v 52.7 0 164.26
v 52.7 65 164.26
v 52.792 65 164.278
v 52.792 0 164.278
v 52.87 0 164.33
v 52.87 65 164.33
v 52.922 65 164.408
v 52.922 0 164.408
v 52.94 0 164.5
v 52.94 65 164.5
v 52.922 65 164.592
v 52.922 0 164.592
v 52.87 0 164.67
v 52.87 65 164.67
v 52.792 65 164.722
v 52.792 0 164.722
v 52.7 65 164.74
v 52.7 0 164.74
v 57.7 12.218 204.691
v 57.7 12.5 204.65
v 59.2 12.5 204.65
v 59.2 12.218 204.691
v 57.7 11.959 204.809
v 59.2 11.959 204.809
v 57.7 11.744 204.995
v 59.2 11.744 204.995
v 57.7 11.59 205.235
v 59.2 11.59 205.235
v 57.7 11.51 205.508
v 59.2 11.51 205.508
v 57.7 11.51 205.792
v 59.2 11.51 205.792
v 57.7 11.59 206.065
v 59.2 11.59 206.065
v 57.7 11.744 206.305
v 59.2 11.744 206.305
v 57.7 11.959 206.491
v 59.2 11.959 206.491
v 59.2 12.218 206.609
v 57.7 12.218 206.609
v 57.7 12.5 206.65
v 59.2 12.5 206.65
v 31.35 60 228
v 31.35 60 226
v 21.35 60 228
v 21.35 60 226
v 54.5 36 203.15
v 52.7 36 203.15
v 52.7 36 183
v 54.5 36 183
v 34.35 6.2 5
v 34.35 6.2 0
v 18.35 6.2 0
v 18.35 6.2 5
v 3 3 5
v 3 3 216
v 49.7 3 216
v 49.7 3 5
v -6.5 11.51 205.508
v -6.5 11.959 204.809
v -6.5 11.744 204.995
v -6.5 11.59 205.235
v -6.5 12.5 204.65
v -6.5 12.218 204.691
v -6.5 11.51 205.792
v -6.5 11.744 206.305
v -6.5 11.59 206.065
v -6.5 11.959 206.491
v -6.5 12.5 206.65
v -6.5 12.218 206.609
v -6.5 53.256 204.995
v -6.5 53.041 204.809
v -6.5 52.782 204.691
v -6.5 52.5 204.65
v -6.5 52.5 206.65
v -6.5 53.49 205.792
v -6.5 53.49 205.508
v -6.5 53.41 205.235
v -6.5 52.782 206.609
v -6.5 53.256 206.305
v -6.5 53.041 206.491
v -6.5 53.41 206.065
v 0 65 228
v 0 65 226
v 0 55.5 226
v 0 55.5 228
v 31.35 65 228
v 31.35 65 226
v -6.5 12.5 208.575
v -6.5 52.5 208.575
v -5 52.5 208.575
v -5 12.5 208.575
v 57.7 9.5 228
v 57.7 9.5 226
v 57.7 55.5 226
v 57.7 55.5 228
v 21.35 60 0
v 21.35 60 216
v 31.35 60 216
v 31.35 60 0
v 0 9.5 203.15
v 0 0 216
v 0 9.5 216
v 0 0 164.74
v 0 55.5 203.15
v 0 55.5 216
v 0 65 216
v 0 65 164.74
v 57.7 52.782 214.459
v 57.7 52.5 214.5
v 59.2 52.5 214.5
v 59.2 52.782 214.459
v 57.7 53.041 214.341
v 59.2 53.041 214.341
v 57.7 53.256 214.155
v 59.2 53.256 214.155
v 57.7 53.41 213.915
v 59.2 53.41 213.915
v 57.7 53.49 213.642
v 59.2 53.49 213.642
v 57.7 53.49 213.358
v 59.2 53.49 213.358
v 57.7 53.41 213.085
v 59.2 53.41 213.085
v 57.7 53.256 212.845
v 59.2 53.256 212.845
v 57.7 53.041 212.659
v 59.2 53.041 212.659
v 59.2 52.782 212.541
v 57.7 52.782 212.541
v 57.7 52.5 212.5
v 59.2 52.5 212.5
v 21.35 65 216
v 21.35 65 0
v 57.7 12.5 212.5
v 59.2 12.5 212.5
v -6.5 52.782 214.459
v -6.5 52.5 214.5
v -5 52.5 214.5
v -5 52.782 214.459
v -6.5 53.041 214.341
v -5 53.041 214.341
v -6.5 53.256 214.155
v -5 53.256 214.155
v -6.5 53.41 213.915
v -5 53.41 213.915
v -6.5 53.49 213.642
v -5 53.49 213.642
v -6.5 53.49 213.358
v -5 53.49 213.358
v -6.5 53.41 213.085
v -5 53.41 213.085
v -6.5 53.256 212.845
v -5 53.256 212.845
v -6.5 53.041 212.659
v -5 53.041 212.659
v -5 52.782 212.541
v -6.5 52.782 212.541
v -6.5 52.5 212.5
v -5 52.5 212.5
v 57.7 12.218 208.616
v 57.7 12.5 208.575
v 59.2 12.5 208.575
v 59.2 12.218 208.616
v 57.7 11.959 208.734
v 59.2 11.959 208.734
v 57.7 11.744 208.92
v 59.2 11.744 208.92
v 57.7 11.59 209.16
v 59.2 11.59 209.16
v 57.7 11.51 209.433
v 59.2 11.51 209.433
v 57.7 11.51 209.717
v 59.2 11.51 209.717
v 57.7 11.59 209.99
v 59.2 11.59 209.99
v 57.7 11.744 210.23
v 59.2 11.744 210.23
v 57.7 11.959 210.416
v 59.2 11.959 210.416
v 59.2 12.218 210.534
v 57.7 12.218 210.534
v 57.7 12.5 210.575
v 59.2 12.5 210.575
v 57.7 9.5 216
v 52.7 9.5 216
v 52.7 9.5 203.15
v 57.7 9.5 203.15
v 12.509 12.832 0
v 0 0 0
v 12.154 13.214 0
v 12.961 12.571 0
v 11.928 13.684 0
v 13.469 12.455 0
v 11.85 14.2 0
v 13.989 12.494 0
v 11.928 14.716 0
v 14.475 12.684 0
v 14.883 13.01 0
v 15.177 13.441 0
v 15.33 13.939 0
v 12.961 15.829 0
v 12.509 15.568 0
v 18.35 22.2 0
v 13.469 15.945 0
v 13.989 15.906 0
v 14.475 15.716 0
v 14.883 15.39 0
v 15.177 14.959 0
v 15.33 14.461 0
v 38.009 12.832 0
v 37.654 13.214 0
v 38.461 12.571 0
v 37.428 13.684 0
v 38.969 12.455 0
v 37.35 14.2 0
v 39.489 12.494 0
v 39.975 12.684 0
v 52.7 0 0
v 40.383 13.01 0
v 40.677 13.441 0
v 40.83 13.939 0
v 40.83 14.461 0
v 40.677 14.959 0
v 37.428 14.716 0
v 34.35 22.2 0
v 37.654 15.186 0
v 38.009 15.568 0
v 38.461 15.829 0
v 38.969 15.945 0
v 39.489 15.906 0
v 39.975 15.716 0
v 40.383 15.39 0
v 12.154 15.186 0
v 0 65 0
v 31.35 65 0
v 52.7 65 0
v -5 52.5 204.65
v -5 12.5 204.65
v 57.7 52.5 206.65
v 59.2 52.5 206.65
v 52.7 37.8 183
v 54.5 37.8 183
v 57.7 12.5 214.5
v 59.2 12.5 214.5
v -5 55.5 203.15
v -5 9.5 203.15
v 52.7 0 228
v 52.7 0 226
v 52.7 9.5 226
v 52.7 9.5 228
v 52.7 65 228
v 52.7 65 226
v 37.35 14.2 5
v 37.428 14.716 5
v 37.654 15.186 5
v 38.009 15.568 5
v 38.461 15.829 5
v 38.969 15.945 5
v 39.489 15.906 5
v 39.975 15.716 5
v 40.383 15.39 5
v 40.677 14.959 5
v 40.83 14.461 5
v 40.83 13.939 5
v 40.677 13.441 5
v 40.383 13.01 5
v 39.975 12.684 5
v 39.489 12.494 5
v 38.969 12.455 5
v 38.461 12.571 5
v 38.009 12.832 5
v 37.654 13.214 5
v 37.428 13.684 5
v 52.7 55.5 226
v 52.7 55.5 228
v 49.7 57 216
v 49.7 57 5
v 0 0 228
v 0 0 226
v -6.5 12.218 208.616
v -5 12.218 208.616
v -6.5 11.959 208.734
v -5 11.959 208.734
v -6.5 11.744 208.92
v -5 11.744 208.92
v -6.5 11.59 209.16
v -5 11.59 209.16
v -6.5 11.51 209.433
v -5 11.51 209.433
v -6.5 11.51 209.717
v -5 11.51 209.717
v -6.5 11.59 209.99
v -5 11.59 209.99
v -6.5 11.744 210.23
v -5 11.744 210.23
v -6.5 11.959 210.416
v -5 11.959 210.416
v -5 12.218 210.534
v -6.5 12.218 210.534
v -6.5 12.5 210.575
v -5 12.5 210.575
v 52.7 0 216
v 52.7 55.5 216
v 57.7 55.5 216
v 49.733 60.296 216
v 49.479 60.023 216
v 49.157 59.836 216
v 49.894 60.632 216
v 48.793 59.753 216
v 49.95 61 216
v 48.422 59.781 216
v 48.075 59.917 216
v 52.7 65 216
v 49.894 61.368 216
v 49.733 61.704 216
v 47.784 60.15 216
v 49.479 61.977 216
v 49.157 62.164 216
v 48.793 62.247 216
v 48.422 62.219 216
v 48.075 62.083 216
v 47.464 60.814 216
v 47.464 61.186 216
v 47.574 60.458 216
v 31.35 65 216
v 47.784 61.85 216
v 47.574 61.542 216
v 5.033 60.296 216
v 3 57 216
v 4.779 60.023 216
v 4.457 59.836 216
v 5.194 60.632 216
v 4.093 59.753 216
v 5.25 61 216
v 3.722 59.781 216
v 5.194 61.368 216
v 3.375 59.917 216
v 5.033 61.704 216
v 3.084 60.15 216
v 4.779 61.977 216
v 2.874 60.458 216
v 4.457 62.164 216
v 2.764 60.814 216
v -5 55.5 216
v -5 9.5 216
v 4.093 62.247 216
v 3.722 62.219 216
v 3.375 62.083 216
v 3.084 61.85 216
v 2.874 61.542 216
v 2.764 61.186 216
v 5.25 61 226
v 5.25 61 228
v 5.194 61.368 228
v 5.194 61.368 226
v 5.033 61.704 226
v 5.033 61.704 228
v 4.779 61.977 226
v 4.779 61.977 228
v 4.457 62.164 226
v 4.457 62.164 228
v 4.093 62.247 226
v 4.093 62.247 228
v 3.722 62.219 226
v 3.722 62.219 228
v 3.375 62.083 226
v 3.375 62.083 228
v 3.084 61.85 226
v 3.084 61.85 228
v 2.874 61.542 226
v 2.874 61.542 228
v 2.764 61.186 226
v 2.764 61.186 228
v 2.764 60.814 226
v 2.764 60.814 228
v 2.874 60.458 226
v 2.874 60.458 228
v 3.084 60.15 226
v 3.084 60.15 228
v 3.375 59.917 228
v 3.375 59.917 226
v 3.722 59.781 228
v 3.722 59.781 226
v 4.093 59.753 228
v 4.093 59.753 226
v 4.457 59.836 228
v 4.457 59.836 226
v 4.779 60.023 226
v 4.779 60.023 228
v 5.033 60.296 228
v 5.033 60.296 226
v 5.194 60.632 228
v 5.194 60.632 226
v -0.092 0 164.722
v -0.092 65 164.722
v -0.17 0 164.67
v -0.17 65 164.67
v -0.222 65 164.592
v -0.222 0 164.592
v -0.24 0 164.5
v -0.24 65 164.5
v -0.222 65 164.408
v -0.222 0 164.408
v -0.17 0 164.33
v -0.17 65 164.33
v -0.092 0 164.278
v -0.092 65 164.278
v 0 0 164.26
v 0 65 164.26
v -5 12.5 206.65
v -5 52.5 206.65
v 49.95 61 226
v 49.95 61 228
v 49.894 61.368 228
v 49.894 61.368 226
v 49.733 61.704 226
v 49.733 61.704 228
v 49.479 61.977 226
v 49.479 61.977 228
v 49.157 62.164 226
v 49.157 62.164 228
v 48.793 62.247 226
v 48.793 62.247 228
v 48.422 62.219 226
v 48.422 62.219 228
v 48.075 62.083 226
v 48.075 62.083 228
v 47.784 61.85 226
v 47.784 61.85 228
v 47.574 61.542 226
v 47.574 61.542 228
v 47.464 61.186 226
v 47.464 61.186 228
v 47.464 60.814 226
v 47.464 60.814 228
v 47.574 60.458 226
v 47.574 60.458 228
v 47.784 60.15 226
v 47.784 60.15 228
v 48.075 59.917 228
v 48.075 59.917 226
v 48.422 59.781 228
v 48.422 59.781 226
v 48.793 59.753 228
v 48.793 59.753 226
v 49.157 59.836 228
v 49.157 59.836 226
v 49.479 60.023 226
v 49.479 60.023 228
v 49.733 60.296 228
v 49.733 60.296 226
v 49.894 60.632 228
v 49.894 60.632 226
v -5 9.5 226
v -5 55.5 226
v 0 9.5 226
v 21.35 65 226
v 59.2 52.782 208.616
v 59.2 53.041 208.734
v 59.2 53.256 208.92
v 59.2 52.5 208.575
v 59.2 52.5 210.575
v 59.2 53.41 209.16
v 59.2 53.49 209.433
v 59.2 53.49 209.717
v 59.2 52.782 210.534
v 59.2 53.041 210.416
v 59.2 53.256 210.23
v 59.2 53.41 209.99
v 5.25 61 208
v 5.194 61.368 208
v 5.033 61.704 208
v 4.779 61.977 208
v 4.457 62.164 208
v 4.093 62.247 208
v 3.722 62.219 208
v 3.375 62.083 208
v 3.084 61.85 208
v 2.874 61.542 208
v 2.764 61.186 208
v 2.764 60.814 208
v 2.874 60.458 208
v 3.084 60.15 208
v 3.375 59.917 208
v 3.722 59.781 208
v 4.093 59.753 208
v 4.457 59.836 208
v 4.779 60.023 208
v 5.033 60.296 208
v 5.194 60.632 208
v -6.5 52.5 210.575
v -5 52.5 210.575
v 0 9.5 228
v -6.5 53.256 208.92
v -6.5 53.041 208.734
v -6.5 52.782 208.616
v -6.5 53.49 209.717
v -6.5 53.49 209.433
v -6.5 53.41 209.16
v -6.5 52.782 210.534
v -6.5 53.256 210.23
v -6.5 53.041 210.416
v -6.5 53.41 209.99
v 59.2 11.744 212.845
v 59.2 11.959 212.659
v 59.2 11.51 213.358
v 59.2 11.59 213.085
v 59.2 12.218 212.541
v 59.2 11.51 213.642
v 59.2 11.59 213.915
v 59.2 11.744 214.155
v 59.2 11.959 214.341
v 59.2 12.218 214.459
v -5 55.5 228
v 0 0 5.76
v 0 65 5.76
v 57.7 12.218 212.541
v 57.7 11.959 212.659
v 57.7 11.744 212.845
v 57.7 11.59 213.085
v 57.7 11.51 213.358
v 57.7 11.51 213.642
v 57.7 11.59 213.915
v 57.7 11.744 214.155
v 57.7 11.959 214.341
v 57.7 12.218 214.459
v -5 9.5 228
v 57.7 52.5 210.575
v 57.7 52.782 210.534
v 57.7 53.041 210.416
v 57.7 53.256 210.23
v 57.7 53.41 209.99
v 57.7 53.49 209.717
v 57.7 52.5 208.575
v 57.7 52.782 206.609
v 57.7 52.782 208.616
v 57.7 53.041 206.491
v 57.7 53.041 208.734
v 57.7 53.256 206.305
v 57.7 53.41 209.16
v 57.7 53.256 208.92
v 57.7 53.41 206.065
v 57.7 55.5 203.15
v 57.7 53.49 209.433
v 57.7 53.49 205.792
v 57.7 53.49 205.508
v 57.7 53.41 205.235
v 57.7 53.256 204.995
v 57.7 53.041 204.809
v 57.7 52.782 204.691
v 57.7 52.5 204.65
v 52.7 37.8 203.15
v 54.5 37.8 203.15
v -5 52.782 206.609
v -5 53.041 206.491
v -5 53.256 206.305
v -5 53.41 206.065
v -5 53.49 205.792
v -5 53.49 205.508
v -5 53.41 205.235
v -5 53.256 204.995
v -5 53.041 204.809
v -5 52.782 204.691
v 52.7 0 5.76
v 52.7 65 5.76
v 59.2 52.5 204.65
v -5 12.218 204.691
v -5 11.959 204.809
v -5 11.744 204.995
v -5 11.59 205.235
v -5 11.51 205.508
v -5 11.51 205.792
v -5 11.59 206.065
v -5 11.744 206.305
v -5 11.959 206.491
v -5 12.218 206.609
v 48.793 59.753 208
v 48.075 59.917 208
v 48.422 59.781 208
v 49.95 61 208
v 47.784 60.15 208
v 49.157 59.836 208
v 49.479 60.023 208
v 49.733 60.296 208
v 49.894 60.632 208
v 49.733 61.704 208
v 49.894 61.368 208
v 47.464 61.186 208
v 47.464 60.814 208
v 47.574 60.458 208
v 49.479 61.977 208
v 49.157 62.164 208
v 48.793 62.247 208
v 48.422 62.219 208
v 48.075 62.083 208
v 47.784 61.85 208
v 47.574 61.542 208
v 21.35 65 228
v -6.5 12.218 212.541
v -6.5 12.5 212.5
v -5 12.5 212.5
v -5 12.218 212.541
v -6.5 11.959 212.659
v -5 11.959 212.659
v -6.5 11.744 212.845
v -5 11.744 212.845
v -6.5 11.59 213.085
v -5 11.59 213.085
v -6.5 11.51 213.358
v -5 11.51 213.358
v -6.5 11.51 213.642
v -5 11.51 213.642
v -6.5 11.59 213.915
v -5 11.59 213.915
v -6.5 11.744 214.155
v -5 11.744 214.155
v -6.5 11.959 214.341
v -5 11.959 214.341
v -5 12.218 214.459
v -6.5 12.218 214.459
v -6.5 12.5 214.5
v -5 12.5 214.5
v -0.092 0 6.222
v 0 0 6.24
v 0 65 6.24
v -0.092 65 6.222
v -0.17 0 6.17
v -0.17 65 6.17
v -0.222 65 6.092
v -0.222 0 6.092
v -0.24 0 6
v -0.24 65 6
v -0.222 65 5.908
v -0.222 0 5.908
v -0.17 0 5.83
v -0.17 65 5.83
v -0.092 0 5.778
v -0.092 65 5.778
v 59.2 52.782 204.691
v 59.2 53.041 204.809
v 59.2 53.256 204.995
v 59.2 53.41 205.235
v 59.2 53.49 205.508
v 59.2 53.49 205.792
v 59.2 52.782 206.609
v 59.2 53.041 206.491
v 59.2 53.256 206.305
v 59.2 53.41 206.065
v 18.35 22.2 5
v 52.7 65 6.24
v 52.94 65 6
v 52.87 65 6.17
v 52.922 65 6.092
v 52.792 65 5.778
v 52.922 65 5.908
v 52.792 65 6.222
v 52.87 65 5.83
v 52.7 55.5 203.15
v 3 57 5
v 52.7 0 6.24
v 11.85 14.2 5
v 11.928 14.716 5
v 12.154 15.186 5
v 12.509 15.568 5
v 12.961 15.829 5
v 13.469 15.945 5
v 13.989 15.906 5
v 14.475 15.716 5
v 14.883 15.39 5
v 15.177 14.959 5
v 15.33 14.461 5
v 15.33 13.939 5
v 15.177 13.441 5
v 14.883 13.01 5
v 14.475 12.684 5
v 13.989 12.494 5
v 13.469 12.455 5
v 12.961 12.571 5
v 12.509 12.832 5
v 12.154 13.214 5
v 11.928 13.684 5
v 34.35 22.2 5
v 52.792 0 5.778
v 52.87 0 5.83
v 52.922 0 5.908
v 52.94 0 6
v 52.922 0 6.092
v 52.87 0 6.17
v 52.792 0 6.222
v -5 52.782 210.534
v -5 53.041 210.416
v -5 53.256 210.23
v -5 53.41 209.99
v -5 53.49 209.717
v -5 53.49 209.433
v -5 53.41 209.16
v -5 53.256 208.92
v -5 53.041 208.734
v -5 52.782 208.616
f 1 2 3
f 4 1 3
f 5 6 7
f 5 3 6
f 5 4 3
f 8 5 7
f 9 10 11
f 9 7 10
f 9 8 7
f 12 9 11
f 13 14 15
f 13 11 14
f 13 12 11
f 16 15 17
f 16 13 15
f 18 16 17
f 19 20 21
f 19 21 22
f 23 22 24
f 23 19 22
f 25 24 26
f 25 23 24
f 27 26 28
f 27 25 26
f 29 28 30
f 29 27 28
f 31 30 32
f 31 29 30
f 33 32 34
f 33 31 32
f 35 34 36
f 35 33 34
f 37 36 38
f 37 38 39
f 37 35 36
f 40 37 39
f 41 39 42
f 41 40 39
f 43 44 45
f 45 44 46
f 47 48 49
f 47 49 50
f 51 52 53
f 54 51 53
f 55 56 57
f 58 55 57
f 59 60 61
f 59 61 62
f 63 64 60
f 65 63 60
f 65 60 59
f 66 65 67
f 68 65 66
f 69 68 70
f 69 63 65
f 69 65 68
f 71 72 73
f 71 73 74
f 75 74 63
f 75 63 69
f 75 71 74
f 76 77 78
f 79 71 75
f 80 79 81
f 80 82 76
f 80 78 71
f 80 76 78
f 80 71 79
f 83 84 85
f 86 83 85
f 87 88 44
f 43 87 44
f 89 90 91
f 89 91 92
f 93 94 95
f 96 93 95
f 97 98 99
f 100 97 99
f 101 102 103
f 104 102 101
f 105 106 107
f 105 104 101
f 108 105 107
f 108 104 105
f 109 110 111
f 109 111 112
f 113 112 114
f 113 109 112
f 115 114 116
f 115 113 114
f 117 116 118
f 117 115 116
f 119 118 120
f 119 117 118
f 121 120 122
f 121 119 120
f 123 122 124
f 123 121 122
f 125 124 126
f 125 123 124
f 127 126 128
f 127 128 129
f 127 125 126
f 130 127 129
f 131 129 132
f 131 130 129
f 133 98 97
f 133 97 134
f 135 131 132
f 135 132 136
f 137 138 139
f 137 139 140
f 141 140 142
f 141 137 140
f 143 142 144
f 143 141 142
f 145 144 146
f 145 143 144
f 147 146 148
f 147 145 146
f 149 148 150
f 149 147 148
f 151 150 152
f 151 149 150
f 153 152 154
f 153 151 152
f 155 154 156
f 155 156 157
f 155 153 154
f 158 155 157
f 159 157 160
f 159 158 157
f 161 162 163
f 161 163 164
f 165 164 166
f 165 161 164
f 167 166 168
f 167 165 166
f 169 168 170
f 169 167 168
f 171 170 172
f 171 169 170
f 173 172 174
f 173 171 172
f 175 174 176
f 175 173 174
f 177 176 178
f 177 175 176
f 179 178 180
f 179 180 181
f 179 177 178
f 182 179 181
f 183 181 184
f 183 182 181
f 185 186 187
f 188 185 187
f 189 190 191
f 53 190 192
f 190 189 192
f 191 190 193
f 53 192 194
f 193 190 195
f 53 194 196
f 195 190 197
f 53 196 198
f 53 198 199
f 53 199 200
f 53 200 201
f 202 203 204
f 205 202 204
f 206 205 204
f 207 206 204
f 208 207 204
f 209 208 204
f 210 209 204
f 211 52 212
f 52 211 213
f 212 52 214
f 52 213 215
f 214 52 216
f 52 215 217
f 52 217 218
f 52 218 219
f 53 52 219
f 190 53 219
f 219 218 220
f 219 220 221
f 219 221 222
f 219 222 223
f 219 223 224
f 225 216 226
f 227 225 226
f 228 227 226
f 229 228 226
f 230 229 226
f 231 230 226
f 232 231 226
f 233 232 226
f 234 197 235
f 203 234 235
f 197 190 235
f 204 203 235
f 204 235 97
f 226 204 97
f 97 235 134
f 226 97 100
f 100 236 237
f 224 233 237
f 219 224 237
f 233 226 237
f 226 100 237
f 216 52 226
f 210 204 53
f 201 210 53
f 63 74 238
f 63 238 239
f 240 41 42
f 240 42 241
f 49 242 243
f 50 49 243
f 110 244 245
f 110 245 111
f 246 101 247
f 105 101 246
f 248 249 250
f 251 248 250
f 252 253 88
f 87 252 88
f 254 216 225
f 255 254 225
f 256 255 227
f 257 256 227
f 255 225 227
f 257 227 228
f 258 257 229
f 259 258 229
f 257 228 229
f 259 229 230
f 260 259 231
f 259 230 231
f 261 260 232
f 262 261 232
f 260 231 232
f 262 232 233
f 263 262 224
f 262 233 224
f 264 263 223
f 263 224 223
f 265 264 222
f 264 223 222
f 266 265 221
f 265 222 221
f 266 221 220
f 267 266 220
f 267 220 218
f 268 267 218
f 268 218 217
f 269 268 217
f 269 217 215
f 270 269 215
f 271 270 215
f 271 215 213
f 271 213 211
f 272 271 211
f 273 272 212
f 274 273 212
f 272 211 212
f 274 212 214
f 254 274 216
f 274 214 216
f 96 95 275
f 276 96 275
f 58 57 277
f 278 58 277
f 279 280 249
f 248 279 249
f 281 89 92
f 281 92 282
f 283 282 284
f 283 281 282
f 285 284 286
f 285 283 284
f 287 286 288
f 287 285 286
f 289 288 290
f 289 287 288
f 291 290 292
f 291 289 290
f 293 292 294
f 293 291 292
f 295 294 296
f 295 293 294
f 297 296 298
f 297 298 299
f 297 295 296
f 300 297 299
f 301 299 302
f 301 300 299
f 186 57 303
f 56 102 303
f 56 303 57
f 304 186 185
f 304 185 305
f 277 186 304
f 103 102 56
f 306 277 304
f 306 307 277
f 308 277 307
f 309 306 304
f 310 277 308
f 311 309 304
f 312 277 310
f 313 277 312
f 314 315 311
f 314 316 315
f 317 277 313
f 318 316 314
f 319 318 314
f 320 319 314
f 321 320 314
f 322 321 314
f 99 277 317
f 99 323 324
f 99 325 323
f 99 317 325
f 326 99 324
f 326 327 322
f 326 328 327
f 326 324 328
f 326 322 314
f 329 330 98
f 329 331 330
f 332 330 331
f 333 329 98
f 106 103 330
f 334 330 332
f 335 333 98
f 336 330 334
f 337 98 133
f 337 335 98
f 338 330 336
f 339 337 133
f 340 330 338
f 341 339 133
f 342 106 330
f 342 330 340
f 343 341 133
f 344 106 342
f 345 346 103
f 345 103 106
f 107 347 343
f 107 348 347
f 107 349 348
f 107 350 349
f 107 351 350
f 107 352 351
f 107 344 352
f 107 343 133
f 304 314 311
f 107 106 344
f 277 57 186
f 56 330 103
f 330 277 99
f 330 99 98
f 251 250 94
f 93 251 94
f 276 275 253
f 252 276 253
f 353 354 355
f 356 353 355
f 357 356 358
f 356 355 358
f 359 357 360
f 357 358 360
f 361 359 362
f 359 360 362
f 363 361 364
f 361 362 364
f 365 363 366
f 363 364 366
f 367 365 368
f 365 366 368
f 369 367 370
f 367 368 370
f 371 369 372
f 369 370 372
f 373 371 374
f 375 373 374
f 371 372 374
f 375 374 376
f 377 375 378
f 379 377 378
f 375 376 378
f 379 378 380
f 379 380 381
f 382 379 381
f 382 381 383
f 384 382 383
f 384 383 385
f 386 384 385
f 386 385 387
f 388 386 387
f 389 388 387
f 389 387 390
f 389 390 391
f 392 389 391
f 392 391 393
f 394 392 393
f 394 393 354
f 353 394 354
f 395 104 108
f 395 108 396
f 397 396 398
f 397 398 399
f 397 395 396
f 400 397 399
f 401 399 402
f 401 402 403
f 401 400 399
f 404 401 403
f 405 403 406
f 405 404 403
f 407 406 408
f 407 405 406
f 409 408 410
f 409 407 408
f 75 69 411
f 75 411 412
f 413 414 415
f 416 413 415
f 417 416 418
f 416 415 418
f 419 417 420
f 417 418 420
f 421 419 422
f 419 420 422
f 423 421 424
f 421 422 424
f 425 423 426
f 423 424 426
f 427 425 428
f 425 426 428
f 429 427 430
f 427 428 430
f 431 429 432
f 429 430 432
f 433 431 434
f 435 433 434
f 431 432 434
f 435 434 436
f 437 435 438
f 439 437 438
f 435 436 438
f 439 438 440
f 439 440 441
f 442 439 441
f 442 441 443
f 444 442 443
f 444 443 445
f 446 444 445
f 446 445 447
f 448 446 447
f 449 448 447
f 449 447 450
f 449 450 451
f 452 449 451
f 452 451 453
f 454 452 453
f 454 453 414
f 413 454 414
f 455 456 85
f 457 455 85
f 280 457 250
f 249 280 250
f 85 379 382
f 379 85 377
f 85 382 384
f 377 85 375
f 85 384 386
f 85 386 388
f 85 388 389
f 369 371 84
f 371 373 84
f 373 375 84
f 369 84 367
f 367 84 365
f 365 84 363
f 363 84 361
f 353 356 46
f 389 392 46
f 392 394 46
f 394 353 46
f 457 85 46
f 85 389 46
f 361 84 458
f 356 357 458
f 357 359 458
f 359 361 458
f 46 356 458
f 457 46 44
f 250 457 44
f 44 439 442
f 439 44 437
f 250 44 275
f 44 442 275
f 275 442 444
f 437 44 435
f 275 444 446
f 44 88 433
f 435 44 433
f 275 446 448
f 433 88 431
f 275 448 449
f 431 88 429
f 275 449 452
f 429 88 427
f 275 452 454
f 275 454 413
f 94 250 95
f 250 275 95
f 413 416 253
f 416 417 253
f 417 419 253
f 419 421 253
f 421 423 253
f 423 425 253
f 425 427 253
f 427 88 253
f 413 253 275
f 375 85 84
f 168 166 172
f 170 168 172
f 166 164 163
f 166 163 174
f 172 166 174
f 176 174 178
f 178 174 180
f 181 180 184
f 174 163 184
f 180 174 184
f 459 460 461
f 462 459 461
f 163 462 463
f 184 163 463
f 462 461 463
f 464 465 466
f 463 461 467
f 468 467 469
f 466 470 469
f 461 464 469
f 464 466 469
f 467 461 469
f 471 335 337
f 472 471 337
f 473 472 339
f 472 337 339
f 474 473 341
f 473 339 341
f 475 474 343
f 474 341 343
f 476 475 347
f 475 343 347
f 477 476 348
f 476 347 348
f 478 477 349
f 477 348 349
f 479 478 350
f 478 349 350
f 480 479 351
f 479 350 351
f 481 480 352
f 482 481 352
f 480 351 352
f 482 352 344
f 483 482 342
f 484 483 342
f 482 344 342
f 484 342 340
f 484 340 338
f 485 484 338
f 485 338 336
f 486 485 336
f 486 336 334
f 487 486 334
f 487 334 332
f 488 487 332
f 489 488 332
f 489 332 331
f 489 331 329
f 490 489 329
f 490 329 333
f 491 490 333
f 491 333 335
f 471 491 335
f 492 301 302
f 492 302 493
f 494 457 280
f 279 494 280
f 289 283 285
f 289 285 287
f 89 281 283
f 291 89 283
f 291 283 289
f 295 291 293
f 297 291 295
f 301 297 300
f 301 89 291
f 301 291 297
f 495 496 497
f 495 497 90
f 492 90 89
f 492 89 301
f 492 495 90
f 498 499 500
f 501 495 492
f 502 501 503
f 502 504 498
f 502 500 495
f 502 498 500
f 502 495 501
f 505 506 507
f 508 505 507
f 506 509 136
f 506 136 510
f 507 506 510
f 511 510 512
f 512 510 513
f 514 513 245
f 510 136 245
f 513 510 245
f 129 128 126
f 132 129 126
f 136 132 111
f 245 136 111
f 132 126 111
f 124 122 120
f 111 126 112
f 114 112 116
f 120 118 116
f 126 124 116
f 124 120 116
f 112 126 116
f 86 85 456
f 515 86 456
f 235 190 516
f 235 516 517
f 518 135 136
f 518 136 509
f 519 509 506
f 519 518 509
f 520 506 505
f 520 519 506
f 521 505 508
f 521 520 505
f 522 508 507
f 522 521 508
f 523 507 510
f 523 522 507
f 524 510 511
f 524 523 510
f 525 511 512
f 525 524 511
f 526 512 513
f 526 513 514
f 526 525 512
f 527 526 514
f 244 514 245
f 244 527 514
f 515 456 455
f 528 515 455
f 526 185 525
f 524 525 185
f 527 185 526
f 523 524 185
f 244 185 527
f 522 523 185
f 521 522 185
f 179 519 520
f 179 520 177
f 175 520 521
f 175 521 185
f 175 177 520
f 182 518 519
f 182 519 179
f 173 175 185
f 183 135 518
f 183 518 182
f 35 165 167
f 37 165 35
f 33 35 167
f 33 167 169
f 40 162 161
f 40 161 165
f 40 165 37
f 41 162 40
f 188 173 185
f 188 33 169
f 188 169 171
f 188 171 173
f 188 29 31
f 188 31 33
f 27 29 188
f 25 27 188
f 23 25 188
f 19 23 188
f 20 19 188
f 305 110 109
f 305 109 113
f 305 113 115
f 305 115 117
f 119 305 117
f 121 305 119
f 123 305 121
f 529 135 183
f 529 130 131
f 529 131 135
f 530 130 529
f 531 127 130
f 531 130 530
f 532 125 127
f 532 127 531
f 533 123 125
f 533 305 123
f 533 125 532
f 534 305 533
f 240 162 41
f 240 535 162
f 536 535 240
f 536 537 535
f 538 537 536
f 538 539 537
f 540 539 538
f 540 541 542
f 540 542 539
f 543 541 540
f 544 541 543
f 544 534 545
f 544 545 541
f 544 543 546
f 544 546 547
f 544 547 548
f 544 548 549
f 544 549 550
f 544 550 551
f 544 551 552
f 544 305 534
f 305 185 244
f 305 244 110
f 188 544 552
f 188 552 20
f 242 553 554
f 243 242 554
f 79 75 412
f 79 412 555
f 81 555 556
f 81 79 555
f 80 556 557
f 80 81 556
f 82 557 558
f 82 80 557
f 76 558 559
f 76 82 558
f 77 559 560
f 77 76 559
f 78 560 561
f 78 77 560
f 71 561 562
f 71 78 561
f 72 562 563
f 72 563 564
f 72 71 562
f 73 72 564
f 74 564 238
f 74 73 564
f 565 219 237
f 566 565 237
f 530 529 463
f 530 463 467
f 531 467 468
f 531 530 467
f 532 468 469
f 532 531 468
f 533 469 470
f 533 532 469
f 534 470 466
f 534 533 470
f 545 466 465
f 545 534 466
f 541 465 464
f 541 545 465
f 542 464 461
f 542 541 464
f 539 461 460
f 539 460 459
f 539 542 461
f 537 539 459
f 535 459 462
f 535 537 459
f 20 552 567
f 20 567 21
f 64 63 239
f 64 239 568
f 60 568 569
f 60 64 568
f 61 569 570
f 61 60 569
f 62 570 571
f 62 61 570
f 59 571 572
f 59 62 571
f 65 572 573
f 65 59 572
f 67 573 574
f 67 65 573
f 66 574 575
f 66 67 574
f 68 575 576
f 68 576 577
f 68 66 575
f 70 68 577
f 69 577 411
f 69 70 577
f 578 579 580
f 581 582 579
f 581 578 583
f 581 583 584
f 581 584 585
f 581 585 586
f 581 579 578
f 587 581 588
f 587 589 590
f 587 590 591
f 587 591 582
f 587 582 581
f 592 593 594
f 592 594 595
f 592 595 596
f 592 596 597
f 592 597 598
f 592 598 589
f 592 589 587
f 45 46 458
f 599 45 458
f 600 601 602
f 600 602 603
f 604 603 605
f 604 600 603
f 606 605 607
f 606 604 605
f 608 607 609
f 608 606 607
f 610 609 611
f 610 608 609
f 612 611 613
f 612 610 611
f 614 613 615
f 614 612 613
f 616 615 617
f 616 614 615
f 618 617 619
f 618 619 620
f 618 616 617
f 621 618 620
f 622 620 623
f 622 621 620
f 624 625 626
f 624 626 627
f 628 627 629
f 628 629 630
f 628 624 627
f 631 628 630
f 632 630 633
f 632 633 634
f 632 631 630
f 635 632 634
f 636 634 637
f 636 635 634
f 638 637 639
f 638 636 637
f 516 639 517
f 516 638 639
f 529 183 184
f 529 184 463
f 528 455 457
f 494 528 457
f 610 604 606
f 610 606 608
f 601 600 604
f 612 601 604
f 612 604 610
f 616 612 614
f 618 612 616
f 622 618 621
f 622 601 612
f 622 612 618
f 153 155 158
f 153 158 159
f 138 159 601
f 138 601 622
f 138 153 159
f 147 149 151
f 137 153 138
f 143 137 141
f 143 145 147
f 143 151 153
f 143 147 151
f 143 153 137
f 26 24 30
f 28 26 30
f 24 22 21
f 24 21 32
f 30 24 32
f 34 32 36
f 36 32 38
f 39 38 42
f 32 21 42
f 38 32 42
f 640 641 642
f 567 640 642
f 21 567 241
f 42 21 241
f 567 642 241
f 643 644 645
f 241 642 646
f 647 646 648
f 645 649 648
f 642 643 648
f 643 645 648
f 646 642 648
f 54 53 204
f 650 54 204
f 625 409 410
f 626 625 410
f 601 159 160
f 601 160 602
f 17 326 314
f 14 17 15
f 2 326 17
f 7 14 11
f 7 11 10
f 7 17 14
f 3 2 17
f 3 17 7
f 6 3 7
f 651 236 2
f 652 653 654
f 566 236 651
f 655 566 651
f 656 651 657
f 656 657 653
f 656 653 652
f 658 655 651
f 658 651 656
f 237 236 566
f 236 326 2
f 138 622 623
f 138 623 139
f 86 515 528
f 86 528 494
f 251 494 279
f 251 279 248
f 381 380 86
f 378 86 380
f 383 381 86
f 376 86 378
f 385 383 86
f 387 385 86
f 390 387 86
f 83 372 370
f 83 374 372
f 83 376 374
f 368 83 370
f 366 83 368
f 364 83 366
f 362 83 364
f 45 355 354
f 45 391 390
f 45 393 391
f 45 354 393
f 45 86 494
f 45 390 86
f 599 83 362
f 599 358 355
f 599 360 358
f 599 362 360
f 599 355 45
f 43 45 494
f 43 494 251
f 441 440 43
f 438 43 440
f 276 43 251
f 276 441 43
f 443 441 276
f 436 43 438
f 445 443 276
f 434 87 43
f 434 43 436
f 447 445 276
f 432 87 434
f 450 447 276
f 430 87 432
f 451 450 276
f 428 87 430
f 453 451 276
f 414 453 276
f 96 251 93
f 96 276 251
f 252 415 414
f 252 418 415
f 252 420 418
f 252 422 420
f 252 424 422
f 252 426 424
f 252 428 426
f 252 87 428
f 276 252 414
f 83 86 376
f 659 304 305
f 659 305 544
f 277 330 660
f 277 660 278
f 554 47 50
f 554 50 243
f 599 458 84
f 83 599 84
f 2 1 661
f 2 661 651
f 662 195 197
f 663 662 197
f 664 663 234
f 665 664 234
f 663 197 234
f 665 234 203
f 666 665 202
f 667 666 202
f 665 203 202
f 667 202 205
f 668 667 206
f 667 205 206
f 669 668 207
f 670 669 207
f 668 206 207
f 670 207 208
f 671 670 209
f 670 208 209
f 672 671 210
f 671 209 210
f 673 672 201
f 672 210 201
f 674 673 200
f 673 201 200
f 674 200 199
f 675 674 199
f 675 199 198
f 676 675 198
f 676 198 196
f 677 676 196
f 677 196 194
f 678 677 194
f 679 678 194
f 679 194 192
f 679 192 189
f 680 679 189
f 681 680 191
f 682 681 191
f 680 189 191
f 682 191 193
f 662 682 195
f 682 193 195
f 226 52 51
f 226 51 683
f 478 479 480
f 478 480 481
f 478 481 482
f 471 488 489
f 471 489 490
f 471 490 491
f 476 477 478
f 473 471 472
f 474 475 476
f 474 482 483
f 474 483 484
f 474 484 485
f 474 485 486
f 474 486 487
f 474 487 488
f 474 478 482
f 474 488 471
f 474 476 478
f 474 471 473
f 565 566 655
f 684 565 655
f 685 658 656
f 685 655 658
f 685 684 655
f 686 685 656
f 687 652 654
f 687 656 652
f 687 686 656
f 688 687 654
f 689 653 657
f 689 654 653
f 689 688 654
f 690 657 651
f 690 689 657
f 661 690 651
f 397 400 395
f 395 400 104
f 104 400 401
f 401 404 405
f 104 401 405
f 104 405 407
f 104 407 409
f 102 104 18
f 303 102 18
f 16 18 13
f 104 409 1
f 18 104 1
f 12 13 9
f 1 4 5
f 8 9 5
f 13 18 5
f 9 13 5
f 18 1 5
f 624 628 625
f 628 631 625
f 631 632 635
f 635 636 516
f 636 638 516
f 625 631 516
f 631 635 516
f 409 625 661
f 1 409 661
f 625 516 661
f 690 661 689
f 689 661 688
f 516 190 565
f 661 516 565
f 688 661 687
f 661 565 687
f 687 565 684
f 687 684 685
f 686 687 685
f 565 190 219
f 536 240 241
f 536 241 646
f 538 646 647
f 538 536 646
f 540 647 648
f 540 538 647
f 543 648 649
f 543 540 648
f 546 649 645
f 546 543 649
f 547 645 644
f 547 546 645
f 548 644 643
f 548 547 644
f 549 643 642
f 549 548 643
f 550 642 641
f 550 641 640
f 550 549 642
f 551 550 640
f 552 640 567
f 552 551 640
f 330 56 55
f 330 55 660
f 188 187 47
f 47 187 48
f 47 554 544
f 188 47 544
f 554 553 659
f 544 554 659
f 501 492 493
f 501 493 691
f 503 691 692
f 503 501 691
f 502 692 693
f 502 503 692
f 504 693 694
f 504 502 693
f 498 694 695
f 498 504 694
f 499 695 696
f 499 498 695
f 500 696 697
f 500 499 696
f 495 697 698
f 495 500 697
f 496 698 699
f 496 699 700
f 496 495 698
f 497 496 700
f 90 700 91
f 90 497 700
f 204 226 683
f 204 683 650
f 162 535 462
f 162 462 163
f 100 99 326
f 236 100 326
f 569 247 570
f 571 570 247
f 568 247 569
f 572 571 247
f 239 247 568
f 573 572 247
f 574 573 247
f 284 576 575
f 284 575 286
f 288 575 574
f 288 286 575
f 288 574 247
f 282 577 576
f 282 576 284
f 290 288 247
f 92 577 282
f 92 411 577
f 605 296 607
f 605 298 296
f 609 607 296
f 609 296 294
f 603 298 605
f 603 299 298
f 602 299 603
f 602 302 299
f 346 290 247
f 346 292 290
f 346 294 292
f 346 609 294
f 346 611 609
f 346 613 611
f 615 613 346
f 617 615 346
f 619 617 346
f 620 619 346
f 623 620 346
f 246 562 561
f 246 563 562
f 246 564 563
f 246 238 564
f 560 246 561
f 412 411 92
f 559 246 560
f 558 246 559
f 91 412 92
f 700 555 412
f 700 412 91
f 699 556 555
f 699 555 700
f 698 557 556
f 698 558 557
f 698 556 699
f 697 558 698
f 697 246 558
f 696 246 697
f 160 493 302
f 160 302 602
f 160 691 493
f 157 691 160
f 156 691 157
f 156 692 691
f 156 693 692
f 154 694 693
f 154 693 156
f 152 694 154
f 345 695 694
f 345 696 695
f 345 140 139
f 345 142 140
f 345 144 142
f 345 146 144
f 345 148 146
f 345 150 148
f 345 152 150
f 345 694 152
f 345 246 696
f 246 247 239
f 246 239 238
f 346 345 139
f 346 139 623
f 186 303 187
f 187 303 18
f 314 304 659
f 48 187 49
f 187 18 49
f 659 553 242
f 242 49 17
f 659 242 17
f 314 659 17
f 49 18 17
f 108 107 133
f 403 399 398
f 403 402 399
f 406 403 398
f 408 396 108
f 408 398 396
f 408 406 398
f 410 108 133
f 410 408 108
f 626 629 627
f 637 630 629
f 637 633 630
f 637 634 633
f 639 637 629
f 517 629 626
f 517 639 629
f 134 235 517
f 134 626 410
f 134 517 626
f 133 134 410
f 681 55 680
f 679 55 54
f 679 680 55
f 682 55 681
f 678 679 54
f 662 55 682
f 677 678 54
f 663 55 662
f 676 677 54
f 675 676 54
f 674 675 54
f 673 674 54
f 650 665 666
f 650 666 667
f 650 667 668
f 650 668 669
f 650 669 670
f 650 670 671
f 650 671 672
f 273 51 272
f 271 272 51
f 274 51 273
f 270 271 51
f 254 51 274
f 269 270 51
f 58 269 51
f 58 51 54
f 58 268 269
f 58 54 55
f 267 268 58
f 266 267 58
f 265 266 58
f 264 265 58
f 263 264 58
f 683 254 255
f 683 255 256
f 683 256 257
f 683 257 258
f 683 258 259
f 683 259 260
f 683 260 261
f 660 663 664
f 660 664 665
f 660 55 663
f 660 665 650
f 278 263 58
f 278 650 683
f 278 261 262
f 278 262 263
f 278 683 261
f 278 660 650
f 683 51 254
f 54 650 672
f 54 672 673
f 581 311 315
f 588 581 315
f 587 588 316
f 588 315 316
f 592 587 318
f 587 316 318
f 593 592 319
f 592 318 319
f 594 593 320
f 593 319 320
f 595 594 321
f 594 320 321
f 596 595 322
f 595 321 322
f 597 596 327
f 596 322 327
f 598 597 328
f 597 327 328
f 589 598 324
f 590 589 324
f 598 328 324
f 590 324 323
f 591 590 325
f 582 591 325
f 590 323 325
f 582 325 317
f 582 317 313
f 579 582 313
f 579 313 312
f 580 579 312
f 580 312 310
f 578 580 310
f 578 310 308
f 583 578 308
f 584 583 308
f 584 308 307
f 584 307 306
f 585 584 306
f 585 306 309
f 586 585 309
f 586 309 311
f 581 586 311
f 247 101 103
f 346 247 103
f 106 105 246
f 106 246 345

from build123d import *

# Parameters (mm, degrees)
SKETCH_1_W          = 52.7
SKETCH_1_H          = 65
EXTRUDE_1_DEPTH     = 216
SKETCH_2_W          = 10
SKETCH_2_H          = 5
CUT_EXTRUDE_1_DEPTH = 232.642591075
SKETCH_3_W          = 46.7
SKETCH_3_H          = 54
CUT_EXTRUDE_2_DEPTH = 211
SKETCH_6_R          = 1.75
SKETCH_6_W          = 16
SKETCH_6_H          = 16
CUT_EXTRUDE_3_DEPTH = 5
SKETCH_7_W          = 1.8
SKETCH_7_H          = 1.8
EXTRUDE_2_DEPTH     = 33
SKETCH_9_W          = 12.85
SKETCH_9_H          = 46
EXTRUDE_3_DEPTH     = 5
SKETCH_10_W         = 12.85
SKETCH_10_H         = 46
EXTRUDE_4_DEPTH     = 5
EXTRUDE_5_DEPTH     = 1.5
EXTRUDE_START       = 1.5
EXTRUDE_6_DEPTH     = 1.5
EXTRUDE_7_DEPTH     = 2
SKETCH_15_R         = 1.25
CUT_EXTRUDE_4_DEPTH = 20
SKETCH_18_R         = 0.24
EXTRUDE_8_DEPTH     = 65


with BuildPart() as part:
    # 草图1 → 凸台-拉伸1 (new body)
    with BuildSketch(Plane.XY):
        with Locations((26.35, 32.5)):
            Rectangle(SKETCH_1_W, SKETCH_1_H)
    extrude(amount=EXTRUDE_1_DEPTH)

    # 草图2 → 切除-拉伸1 (cut, through all)
    with BuildSketch(Plane.XY.offset(216)):
        with Locations((26.35, 62.5)):
            Rectangle(SKETCH_2_W, SKETCH_2_H)
    extrude(amount=-CUT_EXTRUDE_1_DEPTH, mode=Mode.SUBTRACT)

    # 草图3 → 切除-拉伸2 (cut)
    with BuildSketch(Plane.XY.offset(216)):
        with Locations((26.35, 30)):
            Rectangle(SKETCH_3_W, SKETCH_3_H)
    extrude(amount=-CUT_EXTRUDE_2_DEPTH, mode=Mode.SUBTRACT)

    # 草图6 → 切除-拉伸3 (cut)
    with BuildSketch(Plane(origin=(0, 0, 0), x_dir=(-1, 0, 0), z_dir=(0, 0, -1))):
        with Locations((-13.6, 14.2)):
            Circle(SKETCH_6_R)
        with Locations((-39.1, 14.2)):
            Circle(SKETCH_6_R)
        with Locations((-26.35, 14.2)):
            Rectangle(SKETCH_6_W, SKETCH_6_H)
    extrude(amount=-CUT_EXTRUDE_3_DEPTH, mode=Mode.SUBTRACT)

    # 草图7 → 凸台-拉伸2 (add)
    with BuildSketch(Plane.XY.offset(216)):
        with Locations((53.6, 36.9)):
            Rectangle(SKETCH_7_W, SKETCH_7_H)
    extrude(amount=-EXTRUDE_2_DEPTH)

    # 草图9 → 凸台-拉伸3 (add)
    with BuildSketch(Plane.ZY):
        with Locations((209.575, 32.5)):
            Rectangle(SKETCH_9_W, SKETCH_9_H)
    extrude(amount=EXTRUDE_3_DEPTH)

    # 草图10 → 凸台-拉伸4 (add)
    with BuildSketch(Plane(origin=(52.7, 0, 0), x_dir=(0, 0, -1), z_dir=(1, 0, 0))):
        with Locations((-209.575, 32.5)):
            Rectangle(SKETCH_10_W, SKETCH_10_H)
    extrude(amount=EXTRUDE_4_DEPTH)

    # 草图11 → 凸台-拉伸5 (add)
    with BuildSketch(Plane(origin=(57.7, 0, 0), x_dir=(0, 0, -1), z_dir=(1, 0, 0))):
        with BuildLine():
            Line((-214.5, 12.5), (-214.5, 52.5))
            ThreePointArc((-214.5, 52.5), (-213.5, 53.5), (-212.5, 52.5))
            Line((-212.5, 52.5), (-212.5, 12.5))
            ThreePointArc((-212.5, 12.5), (-213.5, 11.5), (-214.5, 12.5))
        make_face()
        with BuildLine():
            Line((-210.575, 12.5), (-210.575, 52.5))
            ThreePointArc((-210.575, 52.5), (-209.575, 53.5), (-208.575, 52.5))
            Line((-208.575, 52.5), (-208.575, 12.5))
            ThreePointArc((-208.575, 12.5), (-209.575, 11.5), (-210.575, 12.5))
        make_face()
        with BuildLine():
            Line((-206.65, 12.5), (-206.65, 52.5))
            ThreePointArc((-206.65, 52.5), (-205.65, 53.5), (-204.65, 52.5))
            Line((-204.65, 52.5), (-204.65, 12.5))
            ThreePointArc((-204.65, 12.5), (-205.65, 11.5), (-206.65, 12.5))
        make_face()
    extrude(amount=EXTRUDE_5_DEPTH)

    # 草图12 → 凸台-拉伸6 (add)
    with BuildSketch(Plane.ZY.offset(5).offset(EXTRUDE_START)):
        with BuildLine():
            Line((214.5, 12.5), (214.5, 52.5))
            ThreePointArc((214.5, 52.5), (213.5, 53.5), (212.5, 52.5))
            Line((212.5, 52.5), (212.5, 12.5))
            ThreePointArc((212.5, 12.5), (213.5, 11.5), (214.5, 12.5))
        make_face()
        with BuildLine():
            Line((206.65, 12.5), (206.65, 52.5))
            ThreePointArc((206.65, 52.5), (205.65, 53.5), (204.65, 52.5))
            Line((204.65, 52.5), (204.65, 12.5))
            ThreePointArc((204.65, 12.5), (205.65, 11.5), (206.65, 12.5))
        make_face()
        with BuildLine():
            Line((210.575, 12.5), (210.575, 52.5))
            ThreePointArc((210.575, 52.5), (209.575, 53.5), (208.575, 52.5))
            Line((208.575, 52.5), (208.575, 12.5))
            ThreePointArc((208.575, 12.5), (209.575, 11.5), (210.575, 12.5))
        make_face()
    extrude(amount=-EXTRUDE_6_DEPTH)


with BuildPart() as body_2:
    # 草图14 → 凸台-拉伸7 (new body)
    with BuildSketch(Plane.XY.offset(226)):
        Polygon((57.7, 55.5), (52.7, 55.5), (52.7, 65), (31.35, 65), (31.35, 60), (21.35, 60), (21.35, 65), (0, 65), (0, 55.5), (-5, 55.5), (-5, 9.5), (0, 9.5), (0, 0), (52.7, 0), (52.7, 9.5), (57.7, 9.5), align=None)
    extrude(amount=EXTRUDE_7_DEPTH)


with BuildPart() as cut_extrude_4_tool:
    # 草图15 → 切除-拉伸4 (new body)
    with BuildSketch(Plane.XY.offset(228)):
        with Locations((4, 61)):
            Circle(SKETCH_15_R)
        with Locations((48.7, 61)):
            Circle(SKETCH_15_R)
    extrude(amount=-CUT_EXTRUDE_4_DEPTH)


with BuildPart() as part_1:
    add(part.part)

    # 切除-拉伸4: cut by cut_extrude_4_tool
    add(cut_extrude_4_tool.part, mode=Mode.SUBTRACT)

    # 草图18 → 凸台-拉伸8 (add)
    with BuildSketch(Plane.XZ):
        with Locations((0, 6)):
            Circle(SKETCH_18_R)
        with Locations((52.7, 6)):
            Circle(SKETCH_18_R)
        with Locations((0, 164.5)):
            Circle(SKETCH_18_R)
        with Locations((52.7, 164.5)):
            Circle(SKETCH_18_R)
    extrude(amount=-EXTRUDE_8_DEPTH)


with BuildPart() as body_2_1:
    add(body_2.part)

    # 切除-拉伸4: cut by cut_extrude_4_tool
    add(cut_extrude_4_tool.part, mode=Mode.SUBTRACT)


solid = Compound([part_1.part, body_2_1.part])
